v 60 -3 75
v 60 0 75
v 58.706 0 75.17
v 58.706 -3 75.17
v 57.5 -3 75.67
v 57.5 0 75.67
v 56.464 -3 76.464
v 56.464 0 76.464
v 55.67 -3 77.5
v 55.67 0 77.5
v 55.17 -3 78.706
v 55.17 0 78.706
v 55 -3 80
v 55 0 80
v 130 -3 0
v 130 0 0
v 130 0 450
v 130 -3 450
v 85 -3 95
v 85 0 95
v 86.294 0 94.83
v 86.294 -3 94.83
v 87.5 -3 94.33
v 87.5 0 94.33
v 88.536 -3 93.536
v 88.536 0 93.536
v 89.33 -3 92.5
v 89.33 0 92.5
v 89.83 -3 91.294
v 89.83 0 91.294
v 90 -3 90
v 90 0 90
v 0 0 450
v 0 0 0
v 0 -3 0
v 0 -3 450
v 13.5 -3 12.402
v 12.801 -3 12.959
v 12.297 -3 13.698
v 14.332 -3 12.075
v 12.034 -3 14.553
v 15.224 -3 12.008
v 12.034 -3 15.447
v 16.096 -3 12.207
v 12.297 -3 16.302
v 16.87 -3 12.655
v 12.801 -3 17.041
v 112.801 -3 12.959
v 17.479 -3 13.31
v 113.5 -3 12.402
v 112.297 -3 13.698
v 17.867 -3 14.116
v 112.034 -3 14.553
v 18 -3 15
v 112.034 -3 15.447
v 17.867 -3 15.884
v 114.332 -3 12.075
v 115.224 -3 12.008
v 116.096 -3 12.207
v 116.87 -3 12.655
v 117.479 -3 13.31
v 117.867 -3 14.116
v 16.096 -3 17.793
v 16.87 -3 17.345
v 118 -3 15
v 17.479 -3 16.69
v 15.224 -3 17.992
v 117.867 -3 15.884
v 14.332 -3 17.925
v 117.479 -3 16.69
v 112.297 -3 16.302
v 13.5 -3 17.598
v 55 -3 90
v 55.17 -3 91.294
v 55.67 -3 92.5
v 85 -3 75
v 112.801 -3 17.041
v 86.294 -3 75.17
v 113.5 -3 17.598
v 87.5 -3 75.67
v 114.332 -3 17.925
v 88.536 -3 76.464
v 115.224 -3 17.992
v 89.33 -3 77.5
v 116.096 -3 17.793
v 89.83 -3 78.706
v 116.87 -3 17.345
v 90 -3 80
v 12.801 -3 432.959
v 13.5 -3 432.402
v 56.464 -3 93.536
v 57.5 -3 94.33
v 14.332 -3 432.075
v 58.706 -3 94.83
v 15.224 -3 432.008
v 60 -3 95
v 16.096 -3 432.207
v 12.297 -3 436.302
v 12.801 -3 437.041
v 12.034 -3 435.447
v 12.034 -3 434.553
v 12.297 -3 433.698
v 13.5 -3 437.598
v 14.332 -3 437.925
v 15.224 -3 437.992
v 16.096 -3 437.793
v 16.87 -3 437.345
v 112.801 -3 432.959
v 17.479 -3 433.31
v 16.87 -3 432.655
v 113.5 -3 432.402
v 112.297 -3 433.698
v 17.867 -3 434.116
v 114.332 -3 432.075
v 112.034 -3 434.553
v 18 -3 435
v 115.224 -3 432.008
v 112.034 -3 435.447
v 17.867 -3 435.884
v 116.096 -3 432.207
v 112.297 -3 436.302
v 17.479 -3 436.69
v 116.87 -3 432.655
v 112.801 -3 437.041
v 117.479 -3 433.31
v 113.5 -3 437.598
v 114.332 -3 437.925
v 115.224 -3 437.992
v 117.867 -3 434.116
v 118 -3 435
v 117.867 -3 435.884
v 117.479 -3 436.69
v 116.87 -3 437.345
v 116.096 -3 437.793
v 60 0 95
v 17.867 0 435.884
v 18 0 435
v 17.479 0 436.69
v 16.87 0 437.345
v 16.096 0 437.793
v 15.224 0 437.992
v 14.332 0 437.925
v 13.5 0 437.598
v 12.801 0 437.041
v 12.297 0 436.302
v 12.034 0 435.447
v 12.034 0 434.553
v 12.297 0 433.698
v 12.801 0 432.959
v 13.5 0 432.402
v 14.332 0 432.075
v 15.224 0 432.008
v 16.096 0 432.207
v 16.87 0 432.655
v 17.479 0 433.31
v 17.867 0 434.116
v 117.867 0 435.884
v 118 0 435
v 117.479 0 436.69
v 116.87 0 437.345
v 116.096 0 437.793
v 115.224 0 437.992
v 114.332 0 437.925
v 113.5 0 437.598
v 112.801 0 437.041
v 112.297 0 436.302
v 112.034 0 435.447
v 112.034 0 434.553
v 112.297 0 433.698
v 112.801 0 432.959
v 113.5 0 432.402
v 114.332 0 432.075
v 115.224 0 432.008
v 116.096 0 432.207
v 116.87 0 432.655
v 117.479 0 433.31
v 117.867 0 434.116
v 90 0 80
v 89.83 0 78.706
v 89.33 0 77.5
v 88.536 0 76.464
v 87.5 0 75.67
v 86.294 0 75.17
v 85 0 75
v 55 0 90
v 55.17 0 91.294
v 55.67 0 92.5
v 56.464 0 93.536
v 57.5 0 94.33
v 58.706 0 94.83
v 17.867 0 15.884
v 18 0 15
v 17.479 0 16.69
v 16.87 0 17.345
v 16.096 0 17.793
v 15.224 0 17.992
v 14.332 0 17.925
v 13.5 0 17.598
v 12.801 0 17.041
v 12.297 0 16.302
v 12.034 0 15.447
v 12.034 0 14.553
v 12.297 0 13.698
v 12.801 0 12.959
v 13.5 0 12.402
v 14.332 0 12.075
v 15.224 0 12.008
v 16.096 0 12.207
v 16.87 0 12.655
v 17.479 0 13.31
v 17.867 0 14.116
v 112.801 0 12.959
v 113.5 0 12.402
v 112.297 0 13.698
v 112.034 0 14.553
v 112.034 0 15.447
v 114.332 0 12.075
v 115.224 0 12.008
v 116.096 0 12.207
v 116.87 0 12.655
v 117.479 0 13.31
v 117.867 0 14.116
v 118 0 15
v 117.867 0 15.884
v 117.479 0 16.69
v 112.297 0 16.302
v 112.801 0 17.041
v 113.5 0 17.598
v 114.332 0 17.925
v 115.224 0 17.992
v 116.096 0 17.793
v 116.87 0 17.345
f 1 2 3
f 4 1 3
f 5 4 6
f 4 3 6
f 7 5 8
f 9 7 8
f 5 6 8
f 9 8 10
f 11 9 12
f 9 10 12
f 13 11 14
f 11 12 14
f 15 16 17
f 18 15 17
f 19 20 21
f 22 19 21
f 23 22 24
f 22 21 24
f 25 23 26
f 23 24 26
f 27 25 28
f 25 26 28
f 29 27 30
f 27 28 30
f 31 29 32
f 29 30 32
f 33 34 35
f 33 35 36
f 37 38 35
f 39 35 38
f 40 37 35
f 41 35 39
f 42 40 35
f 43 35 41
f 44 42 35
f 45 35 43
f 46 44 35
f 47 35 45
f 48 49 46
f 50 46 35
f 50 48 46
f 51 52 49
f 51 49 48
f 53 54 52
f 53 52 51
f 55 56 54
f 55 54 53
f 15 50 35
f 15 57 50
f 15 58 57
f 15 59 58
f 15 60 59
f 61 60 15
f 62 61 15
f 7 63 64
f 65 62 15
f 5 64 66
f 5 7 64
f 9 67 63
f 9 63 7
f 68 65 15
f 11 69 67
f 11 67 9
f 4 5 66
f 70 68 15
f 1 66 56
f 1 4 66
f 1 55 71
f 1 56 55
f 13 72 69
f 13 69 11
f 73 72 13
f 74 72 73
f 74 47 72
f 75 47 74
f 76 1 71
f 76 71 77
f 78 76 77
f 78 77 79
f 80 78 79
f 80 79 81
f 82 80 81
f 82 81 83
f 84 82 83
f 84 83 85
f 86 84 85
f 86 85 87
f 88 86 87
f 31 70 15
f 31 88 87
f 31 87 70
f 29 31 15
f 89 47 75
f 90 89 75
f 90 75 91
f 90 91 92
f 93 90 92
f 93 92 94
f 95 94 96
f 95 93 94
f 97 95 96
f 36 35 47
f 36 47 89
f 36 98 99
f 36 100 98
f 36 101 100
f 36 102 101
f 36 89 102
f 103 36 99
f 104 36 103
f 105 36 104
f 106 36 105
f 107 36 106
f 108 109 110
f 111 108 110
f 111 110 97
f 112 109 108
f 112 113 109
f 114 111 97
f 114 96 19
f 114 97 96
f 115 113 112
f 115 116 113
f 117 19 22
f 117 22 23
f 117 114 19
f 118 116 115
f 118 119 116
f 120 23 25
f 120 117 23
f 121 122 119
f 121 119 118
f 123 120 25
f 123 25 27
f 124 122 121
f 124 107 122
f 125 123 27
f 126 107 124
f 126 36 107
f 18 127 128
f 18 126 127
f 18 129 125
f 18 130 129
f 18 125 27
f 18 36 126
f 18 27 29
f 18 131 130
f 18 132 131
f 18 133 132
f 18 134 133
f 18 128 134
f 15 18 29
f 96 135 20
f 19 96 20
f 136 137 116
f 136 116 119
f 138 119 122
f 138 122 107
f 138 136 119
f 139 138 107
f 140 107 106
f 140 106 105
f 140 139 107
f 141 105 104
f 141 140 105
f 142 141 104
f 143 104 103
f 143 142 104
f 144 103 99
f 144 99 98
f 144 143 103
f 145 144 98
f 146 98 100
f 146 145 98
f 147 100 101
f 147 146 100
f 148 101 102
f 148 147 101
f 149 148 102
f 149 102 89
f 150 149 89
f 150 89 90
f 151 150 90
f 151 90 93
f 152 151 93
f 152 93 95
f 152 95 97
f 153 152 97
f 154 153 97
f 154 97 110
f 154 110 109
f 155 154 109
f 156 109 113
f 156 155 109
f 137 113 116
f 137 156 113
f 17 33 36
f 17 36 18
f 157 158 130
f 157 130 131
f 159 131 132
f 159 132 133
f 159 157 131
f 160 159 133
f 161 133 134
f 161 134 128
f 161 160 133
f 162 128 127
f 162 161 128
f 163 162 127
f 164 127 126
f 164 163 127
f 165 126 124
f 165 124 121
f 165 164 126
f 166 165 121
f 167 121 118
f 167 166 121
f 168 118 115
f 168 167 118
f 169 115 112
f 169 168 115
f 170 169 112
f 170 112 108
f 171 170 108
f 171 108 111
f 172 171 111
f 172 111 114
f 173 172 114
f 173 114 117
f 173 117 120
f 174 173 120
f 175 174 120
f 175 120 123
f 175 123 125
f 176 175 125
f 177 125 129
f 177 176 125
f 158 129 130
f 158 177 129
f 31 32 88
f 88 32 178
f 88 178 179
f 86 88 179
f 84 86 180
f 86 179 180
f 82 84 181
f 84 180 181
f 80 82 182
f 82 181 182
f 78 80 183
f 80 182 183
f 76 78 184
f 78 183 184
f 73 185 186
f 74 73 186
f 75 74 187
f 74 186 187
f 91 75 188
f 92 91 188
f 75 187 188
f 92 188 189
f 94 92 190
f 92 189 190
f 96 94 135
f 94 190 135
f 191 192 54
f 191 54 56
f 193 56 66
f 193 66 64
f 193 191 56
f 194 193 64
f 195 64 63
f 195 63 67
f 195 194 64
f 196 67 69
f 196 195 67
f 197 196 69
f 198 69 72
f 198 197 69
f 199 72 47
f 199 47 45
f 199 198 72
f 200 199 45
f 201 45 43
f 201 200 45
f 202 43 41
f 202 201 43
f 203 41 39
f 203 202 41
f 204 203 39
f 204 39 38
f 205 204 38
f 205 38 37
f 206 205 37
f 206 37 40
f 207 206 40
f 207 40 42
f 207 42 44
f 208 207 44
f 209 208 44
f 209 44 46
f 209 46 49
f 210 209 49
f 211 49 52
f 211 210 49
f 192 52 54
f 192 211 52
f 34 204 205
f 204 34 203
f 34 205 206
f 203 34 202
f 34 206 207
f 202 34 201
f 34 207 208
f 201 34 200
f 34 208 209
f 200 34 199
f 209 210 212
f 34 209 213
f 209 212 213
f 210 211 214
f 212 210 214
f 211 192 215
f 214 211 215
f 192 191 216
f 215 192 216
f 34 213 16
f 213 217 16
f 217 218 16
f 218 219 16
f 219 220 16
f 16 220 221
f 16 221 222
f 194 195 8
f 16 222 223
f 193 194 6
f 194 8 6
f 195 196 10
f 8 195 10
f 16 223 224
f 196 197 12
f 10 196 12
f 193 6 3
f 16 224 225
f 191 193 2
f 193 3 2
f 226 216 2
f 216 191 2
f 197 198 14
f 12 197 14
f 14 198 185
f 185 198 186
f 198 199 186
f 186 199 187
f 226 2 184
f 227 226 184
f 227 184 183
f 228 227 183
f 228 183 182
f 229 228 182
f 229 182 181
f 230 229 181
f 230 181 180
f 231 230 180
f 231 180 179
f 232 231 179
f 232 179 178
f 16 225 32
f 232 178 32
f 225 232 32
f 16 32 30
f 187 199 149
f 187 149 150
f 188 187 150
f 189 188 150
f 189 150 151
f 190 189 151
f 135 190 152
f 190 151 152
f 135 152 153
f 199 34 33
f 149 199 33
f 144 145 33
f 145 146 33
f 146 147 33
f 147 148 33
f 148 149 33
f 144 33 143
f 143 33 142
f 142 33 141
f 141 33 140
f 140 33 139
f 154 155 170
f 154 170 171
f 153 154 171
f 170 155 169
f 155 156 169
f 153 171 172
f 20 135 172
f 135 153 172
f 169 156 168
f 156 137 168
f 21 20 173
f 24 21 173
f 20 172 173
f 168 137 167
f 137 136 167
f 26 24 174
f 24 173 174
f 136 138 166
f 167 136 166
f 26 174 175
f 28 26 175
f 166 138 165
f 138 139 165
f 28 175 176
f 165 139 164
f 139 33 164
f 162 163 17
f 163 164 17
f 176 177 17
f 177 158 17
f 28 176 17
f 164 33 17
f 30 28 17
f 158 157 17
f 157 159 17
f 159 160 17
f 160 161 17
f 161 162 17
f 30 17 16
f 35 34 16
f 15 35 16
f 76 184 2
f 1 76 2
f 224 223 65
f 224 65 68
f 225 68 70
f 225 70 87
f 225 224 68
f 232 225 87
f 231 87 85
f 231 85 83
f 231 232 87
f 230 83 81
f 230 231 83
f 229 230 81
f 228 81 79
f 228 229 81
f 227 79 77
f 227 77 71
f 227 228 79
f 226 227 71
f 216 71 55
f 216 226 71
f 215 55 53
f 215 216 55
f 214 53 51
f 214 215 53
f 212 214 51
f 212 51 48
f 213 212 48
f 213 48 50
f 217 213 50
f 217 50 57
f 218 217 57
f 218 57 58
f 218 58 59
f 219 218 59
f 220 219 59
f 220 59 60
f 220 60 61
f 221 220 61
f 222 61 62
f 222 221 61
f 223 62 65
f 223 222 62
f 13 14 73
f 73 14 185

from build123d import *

# Parameters (mm, degrees)
F0_W     = 130
F0_H     = 450
F0_R     = 3
F1_DEPTH = 3


with BuildPart() as f1:
    # F0 (on Front) → F1 (new body)
    with BuildSketch(Plane.XZ):
        with Locations((65, 225)):
            Rectangle(F0_W, F0_H)
        with Locations((15, 15)):
            Circle(F0_R, mode=Mode.SUBTRACT)
        with BuildLine():
            ThreePointArc((55, 90), (56.464466, 93.535534), (60, 95))
            Line((60, 95), (85, 95))
            ThreePointArc((85, 95), (88.535534, 93.535534), (90, 90))
            Line((90, 90), (90, 80))
            ThreePointArc((90, 80), (88.535534, 76.464466), (85, 75))
            Line((85, 75), (60, 75))
            ThreePointArc((60, 75), (56.464466, 76.464466), (55, 80))
            Line((55, 80), (55, 90))
        make_face(mode=Mode.SUBTRACT)
        with Locations((115, 15)):
            Circle(F0_R, mode=Mode.SUBTRACT)
        with Locations((15, 435)):
            Circle(F0_R, mode=Mode.SUBTRACT)
        with Locations((115, 435)):
            Circle(F0_R, mode=Mode.SUBTRACT)
    extrude(amount=F1_DEPTH)


solid = f1.part
